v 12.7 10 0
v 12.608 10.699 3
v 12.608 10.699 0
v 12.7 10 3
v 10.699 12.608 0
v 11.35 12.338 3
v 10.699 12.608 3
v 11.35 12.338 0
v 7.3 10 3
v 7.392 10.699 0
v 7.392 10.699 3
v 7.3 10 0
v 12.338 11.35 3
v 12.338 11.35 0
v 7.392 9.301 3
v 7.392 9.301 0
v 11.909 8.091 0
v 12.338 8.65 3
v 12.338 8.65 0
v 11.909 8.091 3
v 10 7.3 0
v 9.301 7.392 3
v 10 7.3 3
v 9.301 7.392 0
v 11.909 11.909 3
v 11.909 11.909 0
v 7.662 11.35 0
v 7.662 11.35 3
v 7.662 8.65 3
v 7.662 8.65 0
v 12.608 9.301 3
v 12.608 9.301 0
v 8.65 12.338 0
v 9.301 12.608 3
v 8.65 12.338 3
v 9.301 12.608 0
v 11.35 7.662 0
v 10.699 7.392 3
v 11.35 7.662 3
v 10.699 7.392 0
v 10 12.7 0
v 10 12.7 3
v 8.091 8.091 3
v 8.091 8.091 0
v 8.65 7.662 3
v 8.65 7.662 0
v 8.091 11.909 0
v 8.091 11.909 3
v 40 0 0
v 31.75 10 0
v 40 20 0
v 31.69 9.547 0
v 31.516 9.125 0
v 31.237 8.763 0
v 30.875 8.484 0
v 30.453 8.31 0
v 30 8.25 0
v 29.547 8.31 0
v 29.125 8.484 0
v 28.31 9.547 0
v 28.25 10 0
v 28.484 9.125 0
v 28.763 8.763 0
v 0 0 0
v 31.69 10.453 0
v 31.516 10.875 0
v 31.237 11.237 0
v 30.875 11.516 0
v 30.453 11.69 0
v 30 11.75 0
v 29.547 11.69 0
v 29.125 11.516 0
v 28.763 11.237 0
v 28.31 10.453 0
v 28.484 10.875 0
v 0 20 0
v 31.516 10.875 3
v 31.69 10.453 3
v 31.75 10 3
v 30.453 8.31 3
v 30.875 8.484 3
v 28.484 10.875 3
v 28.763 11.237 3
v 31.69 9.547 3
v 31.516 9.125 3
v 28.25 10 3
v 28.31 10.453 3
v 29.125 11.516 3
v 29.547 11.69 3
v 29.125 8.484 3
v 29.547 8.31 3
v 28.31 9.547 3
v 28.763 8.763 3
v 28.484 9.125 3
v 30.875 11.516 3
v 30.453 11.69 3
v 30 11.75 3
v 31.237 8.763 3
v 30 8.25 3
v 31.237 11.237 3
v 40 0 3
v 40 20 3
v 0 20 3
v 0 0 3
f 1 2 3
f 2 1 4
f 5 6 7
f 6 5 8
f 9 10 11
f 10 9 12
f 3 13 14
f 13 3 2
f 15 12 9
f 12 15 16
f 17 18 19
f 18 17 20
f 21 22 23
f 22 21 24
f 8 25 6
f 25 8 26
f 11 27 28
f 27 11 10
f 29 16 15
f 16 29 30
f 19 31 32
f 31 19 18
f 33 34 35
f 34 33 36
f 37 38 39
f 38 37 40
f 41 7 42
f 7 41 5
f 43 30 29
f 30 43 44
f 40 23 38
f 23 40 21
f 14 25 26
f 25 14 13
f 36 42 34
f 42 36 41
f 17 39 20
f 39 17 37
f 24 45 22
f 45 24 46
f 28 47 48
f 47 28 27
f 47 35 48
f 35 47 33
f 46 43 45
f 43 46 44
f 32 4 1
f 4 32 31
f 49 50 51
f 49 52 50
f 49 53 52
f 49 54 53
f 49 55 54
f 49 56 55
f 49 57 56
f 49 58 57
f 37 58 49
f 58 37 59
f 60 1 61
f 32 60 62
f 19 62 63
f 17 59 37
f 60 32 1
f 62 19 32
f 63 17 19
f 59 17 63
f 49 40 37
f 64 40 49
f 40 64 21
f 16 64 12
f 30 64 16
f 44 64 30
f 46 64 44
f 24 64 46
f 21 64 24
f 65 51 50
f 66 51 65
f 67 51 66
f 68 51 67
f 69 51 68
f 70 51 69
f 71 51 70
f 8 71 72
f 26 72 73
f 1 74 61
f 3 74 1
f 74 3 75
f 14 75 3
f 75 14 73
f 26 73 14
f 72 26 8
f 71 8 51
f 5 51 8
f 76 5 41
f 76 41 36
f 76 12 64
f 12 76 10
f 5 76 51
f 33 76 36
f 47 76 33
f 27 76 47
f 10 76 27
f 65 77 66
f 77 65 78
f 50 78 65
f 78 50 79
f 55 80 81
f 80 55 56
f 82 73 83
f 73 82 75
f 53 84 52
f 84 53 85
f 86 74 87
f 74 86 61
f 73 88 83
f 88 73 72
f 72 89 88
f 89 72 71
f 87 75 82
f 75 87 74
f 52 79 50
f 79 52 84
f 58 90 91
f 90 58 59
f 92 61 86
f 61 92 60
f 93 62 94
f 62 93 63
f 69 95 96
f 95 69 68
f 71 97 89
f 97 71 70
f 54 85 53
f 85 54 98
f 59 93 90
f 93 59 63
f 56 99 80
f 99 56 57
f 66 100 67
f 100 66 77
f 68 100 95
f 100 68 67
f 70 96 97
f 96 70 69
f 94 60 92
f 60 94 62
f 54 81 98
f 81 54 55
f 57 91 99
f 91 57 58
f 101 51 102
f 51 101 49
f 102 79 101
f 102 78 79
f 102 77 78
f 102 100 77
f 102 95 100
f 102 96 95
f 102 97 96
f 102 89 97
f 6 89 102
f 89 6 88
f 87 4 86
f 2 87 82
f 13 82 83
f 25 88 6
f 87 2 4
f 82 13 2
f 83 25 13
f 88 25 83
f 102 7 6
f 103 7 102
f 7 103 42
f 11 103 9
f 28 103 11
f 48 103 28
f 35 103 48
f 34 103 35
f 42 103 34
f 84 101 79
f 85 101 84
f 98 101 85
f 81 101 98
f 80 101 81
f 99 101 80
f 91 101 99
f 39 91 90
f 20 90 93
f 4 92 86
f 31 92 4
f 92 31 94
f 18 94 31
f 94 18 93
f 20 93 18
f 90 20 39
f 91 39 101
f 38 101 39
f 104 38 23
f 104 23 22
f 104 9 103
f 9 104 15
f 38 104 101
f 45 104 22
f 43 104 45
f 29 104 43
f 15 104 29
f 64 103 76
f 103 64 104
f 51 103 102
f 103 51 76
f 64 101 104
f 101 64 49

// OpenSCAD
difference()
{
    union()
    {
        cube([40,20,3]);
    }
    union()
    {
        translate([10,10,0])
            cylinder(d=5.4,h=5,$fn=24);
        translate([30,10,0])
            cylinder(d=3.5,h=5,$fn=24);
    }
}
